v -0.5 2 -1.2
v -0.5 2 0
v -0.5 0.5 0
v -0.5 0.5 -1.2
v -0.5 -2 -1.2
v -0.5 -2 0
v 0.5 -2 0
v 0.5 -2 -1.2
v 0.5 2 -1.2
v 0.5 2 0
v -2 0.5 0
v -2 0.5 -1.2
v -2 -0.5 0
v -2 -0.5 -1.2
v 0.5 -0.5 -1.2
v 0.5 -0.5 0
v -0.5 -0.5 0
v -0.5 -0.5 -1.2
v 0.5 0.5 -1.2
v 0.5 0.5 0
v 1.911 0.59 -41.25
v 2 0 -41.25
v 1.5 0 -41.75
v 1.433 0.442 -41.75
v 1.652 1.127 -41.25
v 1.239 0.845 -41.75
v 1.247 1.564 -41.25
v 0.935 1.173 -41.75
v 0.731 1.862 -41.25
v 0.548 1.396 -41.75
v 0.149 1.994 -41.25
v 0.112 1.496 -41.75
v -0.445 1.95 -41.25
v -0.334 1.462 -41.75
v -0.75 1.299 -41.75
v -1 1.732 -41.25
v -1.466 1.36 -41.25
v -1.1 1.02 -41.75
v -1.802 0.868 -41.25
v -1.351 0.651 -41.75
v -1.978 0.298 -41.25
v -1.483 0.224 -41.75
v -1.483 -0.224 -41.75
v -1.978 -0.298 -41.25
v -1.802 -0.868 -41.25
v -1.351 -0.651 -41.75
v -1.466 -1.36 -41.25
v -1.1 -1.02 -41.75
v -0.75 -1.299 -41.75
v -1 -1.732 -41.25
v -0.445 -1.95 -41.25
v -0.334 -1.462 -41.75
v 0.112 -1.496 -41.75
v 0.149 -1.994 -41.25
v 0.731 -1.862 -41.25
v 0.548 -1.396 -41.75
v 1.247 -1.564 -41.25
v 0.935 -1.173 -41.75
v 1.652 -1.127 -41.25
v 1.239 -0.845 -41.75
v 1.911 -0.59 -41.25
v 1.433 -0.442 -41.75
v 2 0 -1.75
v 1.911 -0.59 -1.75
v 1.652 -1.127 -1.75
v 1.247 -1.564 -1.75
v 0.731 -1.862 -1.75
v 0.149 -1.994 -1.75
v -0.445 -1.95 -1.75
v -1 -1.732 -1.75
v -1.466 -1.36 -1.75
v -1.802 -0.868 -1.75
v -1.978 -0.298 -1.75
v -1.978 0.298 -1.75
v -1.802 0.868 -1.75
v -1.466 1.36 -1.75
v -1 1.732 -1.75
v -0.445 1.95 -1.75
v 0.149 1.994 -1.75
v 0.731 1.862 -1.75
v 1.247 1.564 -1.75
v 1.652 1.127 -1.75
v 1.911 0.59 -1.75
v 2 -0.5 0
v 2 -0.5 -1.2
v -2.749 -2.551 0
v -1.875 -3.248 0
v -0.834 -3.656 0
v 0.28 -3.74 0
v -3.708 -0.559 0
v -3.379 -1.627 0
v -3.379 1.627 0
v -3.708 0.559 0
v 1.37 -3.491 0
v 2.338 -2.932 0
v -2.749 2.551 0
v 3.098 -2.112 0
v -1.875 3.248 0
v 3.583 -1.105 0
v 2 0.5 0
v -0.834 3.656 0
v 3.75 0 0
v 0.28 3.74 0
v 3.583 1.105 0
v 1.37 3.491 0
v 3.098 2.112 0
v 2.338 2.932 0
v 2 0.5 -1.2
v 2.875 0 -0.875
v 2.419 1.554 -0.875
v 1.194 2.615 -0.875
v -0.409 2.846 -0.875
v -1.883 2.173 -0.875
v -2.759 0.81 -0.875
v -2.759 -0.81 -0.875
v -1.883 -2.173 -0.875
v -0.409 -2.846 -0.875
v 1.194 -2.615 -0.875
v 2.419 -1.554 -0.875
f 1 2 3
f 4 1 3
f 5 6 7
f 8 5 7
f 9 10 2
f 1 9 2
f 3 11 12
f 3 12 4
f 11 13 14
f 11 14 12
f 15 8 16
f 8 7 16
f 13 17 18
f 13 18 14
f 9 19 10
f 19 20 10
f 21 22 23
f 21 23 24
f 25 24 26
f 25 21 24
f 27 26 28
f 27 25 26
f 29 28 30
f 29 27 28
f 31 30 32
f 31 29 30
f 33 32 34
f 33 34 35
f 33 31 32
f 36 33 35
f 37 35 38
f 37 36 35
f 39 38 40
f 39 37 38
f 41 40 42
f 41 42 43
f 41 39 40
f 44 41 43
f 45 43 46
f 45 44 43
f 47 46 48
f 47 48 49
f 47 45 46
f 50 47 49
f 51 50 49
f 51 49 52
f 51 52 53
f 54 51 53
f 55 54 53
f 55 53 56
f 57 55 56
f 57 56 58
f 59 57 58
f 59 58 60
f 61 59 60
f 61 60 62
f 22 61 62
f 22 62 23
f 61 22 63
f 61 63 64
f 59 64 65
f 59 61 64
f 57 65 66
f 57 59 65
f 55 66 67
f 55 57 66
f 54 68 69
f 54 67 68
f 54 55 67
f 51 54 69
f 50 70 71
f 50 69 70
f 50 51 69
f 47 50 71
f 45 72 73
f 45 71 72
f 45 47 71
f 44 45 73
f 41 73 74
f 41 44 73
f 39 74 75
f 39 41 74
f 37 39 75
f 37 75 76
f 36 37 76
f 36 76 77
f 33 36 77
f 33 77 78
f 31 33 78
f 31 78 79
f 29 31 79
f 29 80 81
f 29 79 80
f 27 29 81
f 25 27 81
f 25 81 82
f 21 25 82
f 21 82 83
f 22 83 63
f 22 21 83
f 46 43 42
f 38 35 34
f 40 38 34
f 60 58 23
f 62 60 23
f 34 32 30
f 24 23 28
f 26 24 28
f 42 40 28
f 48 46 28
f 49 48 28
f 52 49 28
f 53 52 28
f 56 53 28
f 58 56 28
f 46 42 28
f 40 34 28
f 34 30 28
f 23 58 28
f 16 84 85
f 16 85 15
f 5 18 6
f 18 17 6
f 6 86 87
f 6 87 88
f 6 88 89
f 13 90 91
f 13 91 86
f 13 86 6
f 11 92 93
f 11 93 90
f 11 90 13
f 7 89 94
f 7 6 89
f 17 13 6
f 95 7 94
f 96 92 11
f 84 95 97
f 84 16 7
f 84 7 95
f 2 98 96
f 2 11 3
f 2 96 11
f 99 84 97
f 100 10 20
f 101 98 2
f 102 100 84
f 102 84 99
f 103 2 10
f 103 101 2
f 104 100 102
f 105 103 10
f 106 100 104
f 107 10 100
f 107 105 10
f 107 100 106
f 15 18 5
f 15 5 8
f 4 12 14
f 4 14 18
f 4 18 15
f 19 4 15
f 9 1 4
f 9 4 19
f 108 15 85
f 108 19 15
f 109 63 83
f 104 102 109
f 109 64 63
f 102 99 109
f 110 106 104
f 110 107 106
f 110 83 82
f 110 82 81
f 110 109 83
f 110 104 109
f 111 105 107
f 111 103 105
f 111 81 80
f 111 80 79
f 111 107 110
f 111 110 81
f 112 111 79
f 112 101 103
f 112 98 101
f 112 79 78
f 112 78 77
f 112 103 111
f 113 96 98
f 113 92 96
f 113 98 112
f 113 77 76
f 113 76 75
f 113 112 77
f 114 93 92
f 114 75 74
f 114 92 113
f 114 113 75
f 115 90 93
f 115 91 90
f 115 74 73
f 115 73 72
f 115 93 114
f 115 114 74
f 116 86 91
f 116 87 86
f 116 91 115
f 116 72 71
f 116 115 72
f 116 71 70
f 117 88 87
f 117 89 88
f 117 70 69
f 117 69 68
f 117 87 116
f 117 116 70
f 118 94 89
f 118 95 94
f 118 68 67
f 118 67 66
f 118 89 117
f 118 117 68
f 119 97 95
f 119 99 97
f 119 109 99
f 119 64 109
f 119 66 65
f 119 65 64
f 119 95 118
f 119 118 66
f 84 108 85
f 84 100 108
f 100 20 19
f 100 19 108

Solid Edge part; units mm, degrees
sketch "Sketch1" plane through (0, 0, 0) normal (0, -1, 0) x (1, 0, 0)
  line L0 (0, 0) -> (3.75, 0)
  line L1 (3.75, 0) -> (2, -1.75)
  line L2 (2, -1.75) -> (2, -41.75)
  line L3 (2, -41.75) -> (0, -41.75)
  dimension "D1" = 40
revolve "RevolvedProtrusion1" add sketch "Sketch1" angle 360 about axis through (0, 0, -21.75) along (0, 0, 1)
chamfer "end_chamfer" distance 0.5 angle 45 1 edges at (-2, 0, -41.75)
sketch "Sketch2" plane through (0, 0, 0) normal (0, 0, 1) x (0, 1, 0)
  line L0 (0.5, -0.5) -> (2, -0.5)
  line L1 (2, -0.5) -> (2, 0.5)
  line L2 (2, 0.5) -> (0.5, 0.5)
  line L3 (0.5, 2) -> (0.5, 0.5)
  line L4 (-0.5, 2) -> (0.5, 2)
  line L5 (-0.5, 0.5) -> (-0.5, 2)
  line L6 (-0.5, 0.5) -> (-2, 0.5)
  line L7 (-2, 0.5) -> (-2, -0.5)
  line L8 (-2, -0.5) -> (-0.5, -0.5)
  line L9 (-0.5, -2) -> (-0.5, -0.5)
  line L10 (0.5, -2) -> (-0.5, -2)
  line L11 (0.5, -0.5) -> (0.5, -2)
  dimension "D1" = 4
  dimension "D2" = 1
extrude "x_slot" cut sketch "Sketch2" against normal blind 1.2
cosmetic_thread "Thread1" size "M4"
properties part number "STD-DIN965-M4x40" material "Stainless steel"
